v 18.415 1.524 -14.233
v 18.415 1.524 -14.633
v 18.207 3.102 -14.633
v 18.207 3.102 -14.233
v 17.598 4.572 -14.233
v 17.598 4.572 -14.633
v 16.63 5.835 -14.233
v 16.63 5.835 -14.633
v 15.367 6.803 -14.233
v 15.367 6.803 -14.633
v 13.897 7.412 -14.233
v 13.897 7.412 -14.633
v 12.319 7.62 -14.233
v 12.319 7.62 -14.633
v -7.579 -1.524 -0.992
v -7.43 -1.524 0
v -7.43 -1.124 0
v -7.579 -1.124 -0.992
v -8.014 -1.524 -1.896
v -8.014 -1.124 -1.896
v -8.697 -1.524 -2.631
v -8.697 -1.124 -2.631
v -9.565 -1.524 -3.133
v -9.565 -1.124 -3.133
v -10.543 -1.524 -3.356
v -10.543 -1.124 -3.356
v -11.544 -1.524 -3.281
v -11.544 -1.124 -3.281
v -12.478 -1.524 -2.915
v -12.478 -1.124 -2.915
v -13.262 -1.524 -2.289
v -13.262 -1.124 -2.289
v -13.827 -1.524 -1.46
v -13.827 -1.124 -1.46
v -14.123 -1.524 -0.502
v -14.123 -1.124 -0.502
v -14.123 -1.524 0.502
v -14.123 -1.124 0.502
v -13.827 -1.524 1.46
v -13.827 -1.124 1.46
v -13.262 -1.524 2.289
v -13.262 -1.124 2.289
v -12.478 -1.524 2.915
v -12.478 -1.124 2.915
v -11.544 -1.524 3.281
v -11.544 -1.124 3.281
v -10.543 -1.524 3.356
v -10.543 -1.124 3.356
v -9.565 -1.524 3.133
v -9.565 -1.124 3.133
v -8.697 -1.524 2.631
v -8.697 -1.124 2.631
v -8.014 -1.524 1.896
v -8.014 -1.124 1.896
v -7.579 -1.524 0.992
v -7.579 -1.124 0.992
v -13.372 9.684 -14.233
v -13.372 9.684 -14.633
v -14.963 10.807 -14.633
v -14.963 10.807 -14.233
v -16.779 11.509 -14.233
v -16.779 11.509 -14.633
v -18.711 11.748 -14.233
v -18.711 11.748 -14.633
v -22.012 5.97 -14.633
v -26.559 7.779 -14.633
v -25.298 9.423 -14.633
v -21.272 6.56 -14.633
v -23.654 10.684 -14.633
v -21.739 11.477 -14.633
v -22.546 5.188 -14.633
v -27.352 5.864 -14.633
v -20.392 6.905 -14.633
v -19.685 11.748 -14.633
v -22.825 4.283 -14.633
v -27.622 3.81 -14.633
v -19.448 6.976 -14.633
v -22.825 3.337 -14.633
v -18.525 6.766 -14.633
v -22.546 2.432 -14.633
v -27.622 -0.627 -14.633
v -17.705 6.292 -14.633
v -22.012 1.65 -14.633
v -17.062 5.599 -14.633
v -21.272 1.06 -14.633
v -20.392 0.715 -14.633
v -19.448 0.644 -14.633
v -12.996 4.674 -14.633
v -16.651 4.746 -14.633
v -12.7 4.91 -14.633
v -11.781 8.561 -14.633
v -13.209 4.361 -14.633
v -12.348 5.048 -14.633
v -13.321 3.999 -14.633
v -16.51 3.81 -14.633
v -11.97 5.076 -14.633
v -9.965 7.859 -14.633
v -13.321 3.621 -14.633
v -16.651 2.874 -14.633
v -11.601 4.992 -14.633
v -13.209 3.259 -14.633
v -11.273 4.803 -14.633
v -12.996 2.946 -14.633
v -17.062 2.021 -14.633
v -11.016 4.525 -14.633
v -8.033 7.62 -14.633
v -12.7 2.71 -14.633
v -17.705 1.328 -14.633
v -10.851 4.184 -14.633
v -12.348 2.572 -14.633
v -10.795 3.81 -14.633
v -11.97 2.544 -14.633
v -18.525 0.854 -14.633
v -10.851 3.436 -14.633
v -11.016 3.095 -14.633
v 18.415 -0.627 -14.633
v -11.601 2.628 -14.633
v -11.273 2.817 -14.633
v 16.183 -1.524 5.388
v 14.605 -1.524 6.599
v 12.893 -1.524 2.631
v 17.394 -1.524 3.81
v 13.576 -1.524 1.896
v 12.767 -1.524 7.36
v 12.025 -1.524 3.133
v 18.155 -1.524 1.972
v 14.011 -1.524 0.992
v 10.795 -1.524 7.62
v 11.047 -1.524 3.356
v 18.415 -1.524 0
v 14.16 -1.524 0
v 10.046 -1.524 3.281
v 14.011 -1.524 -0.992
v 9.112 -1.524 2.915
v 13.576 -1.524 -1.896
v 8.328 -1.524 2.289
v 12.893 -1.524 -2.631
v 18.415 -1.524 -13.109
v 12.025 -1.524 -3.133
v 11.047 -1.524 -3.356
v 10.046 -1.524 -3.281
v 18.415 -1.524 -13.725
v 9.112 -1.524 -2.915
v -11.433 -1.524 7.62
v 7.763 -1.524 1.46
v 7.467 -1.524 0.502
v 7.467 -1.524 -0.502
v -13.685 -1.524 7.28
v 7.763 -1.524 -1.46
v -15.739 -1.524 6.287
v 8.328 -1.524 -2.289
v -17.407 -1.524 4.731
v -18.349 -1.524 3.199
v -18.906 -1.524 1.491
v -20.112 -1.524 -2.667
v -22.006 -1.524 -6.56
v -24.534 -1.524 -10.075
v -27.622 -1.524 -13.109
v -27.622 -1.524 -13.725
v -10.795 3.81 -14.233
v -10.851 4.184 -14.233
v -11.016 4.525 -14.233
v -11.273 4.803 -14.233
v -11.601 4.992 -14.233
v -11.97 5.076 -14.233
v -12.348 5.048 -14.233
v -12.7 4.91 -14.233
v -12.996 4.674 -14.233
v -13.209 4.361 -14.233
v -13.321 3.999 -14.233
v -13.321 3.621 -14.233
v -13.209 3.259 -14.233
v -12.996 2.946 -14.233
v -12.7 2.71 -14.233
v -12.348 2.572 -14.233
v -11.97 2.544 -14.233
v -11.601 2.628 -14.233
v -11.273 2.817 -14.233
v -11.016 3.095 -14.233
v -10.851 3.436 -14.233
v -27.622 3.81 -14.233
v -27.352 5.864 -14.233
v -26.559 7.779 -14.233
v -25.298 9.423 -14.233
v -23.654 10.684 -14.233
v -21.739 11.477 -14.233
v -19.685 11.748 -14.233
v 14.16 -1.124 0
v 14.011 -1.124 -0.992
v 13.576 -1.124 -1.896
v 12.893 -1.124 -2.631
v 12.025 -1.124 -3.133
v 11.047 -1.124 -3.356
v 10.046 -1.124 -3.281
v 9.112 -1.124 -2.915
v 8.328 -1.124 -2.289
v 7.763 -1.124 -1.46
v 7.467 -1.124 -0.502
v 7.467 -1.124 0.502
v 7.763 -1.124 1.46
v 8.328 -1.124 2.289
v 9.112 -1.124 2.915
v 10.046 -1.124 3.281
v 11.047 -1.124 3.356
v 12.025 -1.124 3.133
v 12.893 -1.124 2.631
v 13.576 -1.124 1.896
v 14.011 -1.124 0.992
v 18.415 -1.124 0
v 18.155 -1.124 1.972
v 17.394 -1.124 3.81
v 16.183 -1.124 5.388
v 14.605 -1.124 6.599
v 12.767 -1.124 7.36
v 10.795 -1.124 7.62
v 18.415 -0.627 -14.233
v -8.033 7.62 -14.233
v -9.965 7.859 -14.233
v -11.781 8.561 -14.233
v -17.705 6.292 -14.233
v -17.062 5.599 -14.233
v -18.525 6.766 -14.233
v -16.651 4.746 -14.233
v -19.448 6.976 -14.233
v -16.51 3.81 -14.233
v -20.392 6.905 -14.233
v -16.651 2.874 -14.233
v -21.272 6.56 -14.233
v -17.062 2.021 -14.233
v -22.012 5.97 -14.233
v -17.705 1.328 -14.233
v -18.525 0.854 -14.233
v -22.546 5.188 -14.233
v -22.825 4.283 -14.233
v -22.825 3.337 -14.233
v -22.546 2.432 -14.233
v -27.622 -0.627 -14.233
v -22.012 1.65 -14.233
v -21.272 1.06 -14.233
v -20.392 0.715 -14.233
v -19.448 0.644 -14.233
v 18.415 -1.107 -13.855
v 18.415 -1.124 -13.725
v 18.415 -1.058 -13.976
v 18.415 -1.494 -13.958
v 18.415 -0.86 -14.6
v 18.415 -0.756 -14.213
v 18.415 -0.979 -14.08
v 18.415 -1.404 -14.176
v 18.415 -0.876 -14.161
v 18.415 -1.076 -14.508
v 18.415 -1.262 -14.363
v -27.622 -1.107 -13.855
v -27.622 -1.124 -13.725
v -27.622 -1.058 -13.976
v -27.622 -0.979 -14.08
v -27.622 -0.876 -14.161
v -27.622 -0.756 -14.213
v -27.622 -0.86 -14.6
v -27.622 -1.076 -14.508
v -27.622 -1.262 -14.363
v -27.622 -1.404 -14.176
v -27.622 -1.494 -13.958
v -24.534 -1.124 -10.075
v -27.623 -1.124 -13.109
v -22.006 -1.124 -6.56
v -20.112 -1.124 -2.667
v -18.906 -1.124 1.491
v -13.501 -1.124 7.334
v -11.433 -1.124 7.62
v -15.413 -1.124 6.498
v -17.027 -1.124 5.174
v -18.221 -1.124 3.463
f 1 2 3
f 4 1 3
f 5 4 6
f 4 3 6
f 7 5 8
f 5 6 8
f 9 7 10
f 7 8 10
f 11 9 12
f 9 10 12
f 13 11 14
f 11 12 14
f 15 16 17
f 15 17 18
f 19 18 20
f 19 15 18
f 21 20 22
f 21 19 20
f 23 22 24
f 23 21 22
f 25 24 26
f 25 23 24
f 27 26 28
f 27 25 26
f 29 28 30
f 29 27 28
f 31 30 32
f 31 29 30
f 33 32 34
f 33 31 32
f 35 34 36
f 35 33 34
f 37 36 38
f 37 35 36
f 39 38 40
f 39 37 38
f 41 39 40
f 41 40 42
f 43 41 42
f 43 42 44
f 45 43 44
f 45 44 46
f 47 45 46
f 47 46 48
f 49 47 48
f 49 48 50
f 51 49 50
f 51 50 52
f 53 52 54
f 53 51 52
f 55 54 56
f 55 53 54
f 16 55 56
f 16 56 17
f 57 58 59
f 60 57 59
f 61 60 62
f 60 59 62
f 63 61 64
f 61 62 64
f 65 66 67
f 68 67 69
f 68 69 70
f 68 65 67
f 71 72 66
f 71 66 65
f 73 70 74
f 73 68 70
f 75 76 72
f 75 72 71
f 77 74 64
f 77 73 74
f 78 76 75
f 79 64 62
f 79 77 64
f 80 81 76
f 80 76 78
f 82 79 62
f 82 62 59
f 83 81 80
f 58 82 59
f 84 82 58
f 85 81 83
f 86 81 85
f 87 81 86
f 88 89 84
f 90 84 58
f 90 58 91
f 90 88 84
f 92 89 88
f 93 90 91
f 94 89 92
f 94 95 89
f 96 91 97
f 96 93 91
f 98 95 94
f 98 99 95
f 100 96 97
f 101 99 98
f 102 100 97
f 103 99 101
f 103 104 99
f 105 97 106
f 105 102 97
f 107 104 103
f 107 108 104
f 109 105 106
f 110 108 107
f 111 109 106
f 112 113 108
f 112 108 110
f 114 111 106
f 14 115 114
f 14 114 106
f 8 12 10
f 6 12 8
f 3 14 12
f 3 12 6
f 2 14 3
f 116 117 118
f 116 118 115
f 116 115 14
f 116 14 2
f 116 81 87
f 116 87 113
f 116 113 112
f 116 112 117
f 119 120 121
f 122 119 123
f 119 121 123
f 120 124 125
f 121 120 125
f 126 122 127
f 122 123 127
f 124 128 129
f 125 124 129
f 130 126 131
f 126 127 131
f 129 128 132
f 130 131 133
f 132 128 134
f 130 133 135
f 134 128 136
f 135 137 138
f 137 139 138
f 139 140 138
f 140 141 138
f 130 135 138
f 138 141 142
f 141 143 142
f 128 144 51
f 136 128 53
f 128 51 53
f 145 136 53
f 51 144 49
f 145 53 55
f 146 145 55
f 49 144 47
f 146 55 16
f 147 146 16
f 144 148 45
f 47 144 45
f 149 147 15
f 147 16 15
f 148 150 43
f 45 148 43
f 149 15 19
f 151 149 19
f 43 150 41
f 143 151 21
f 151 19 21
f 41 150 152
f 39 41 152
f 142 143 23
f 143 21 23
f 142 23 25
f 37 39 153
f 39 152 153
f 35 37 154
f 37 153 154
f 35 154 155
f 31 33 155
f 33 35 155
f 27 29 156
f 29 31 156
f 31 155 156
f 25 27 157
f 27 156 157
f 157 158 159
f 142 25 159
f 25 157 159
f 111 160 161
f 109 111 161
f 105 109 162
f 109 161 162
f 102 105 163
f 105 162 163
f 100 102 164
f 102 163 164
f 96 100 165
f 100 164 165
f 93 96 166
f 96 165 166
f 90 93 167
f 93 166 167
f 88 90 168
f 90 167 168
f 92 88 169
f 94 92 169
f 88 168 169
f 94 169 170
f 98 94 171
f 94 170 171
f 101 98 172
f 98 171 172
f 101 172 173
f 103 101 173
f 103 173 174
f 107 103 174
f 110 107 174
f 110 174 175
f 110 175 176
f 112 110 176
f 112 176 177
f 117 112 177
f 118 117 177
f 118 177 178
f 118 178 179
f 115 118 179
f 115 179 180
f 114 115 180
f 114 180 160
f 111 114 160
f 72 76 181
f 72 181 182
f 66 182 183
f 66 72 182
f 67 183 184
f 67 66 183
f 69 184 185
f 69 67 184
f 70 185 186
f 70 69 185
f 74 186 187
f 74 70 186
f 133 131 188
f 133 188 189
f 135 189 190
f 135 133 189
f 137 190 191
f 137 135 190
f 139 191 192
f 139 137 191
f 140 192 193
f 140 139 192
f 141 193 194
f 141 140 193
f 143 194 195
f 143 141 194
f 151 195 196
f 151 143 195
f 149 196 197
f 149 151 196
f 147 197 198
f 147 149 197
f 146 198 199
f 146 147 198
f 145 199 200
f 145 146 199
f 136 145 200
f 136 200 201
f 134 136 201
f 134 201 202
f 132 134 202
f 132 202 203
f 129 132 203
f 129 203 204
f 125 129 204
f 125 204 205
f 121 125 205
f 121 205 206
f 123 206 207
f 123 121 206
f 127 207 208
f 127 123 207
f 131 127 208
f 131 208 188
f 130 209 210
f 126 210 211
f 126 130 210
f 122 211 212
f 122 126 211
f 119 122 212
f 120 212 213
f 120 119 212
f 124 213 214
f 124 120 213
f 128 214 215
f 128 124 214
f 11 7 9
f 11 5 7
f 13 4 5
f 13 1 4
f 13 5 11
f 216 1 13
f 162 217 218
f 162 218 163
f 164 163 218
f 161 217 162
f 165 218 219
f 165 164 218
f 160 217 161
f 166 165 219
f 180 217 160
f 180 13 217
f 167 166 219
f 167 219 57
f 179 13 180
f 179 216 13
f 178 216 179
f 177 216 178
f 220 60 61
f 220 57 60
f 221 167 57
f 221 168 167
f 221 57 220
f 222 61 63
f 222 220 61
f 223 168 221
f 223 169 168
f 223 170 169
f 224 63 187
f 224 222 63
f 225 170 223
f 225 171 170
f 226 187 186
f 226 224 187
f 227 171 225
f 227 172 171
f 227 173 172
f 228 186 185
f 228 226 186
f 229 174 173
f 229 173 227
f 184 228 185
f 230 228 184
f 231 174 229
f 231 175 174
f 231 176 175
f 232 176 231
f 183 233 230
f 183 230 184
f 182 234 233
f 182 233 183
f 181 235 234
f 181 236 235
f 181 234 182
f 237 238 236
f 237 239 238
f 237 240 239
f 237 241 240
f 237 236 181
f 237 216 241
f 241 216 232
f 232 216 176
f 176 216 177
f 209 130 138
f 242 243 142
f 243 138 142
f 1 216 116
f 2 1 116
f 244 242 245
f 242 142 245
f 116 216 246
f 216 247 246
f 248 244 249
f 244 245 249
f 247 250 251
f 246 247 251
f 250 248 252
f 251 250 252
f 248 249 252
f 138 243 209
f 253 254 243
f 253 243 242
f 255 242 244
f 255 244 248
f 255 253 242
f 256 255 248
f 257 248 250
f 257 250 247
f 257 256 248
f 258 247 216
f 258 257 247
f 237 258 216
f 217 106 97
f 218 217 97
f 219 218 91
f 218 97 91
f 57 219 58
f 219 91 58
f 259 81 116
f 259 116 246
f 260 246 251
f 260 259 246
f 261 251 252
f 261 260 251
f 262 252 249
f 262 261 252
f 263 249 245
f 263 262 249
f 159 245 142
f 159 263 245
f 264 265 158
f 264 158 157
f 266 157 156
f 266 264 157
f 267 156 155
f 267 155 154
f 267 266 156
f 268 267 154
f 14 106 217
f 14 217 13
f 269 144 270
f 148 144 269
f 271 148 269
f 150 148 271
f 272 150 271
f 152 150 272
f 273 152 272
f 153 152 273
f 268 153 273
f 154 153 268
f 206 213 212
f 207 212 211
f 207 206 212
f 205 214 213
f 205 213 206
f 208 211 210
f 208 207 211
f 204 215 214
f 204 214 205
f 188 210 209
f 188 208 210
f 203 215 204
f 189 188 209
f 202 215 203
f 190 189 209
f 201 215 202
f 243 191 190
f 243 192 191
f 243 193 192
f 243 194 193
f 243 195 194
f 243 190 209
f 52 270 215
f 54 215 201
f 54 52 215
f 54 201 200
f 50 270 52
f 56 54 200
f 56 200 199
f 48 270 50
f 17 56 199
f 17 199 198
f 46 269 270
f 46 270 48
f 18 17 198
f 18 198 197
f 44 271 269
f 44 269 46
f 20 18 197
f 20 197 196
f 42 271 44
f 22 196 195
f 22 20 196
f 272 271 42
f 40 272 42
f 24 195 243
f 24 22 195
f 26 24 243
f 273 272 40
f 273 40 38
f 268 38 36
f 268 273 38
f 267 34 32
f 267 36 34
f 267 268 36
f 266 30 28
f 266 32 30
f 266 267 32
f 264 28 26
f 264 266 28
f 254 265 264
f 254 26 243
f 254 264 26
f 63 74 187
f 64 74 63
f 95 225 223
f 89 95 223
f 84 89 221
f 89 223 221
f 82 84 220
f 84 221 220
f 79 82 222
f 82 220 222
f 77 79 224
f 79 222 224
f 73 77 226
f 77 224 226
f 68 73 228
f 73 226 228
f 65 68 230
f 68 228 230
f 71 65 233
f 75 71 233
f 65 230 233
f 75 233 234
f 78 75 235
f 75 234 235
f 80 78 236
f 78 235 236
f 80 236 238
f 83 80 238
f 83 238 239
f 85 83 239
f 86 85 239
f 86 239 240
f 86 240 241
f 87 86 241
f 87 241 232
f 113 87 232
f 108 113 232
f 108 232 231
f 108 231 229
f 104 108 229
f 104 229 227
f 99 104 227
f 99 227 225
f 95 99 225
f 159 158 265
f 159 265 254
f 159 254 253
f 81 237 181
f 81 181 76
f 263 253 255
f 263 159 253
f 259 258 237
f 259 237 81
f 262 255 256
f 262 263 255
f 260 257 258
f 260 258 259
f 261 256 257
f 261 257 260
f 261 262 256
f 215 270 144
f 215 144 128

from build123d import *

# Parameters (mm, degrees)
SKETCH1_R                    = 3.3655
BOSS_EXTRUDE1_DEPTH          = 1.524
SKETCH2_R                    = 3.3655
CUT_EXTRUDE1_DEPTH           = 1.524
CUT_EXTRUDE1_DRAFT           = 46
CUT_EXTRUDE1_PROFILE_2_DEPTH = 1.524
CUT_EXTRUDE1_PROFILE_2_DRAFT = 46
FILLET1_R                    = 25.4
SKETCH3_W                    = 15.875
SKETCH3_H                    = 1.524
BOSS_EXTRUDE2_DEPTH          = 11.7475
FILLET3_R                    = 7.9375
SKETCH5_W                    = 30.1625
SKETCH5_H                    = 1.524
BOSS_EXTRUDE3_DEPTH          = 7.62
SKETCH4_R                    = 3.175
SKETCH4_R_2                  = 1.27
CUT_EXTRUDE2_DEPTH           = 19.05
FILLET7_R                    = 7.62
FILLET10_R                   = 6.096
FILLET13_R                   = 7.9375
FILLET14_R                   = 7.9375
CONVERT_SOLID1_START         = -0.62672976
CONVERT_SOLID1_OUTLINE_R     = 3.3655
CONVERT_SOLID1_DEPTH         = 12.37422976
CONVERT_SOLID1_START_2       = -1.124
CONVERT_SOLID1_2_OUTLINE_R   = 3.3655
CONVERT_SOLID1_2_DEPTH       = 0.508
CONVERT_SOLID1_START_3       = -1.524
CONVERT_SOLID1_3_OUTLINE_R   = 3.3655
CONVERT_SOLID1_3_DEPTH       = 0.4
CONVERT_SOLID1_START_4       = -27.6225
CONVERT_SOLID1_4_DEPTH       = 46.0375


with BuildPart() as part:
    # Sketch1 → Boss-Extrude1 (new body)
    with BuildSketch(Plane(origin=(0, 0, 0), x_dir=(1, 0, 0), z_dir=(0, 1, 0))):
        Polygon((-27.6225, 14.6328892), (-27.6225, 13.1088892), (-18.415, 6.7588892), (-18.415, -7.62), (18.415, -7.62), (18.415, 14.6328892), align=None)
        with Locations(Location((-10.795, 0, 0), (0, 0, 270))):
            Circle(SKETCH1_R, mode=Mode.SUBTRACT)
        with Locations(Location((10.795, 0, 0), (0, 0, 270))):
            Circle(SKETCH1_R, mode=Mode.SUBTRACT)
    extrude(amount=-BOSS_EXTRUDE1_DEPTH)


with BuildPart() as cut_extrude1_tool:
    # Sketch2 → Cut-Extrude1 (with draft: the straight prism first)
    with BuildSketch(Plane.XZ.offset(1.524)):
        with Locations((-10.795, 0)):
            Circle(SKETCH2_R)
    extrude(amount=-CUT_EXTRUDE1_DEPTH)
    # Cut-Extrude1: the draft: its side faces are tilted about the plane it starts from
    cut_extrude1_sides = [cut_extrude1_tool.faces().sort_by_distance(p)[0] for p in [
        (-14.1605, -0.762, 0),
    ]]
    draft(cut_extrude1_sides, Plane.XZ.offset(1.524), CUT_EXTRUDE1_DRAFT)


with BuildPart() as part_1:
    add(part.part)

    # Cut-Extrude1: cut by cut_extrude1_tool
    add(cut_extrude1_tool.part, mode=Mode.SUBTRACT)


with BuildPart() as cut_extrude1_profile_2_tool:
    # Sketch2 → Cut-Extrude1 profile 2 (with draft: the straight prism first)
    with BuildSketch(Plane.XZ.offset(1.524)):
        with Locations((10.795, 0)):
            Circle(SKETCH2_R)
    extrude(amount=-CUT_EXTRUDE1_PROFILE_2_DEPTH)
    # Cut-Extrude1 profile 2: the draft: its side faces are tilted about the plane it starts from
    cut_extrude1_profile_2_sides = [cut_extrude1_profile_2_tool.faces().sort_by_distance(p)[0] for p in [
        (7.4295, -0.762, 0),
    ]]
    draft(cut_extrude1_profile_2_sides, Plane.XZ.offset(1.524), CUT_EXTRUDE1_PROFILE_2_DRAFT)


with BuildPart() as part_2:
    add(part_1.part)

    # Cut-Extrude1 profile 2: cut by cut_extrude1_profile_2_tool
    add(cut_extrude1_profile_2_tool.part, mode=Mode.SUBTRACT)

    # Fillet1
    # the kernel refuses this fillet: 25.4 mm, written as the material it adds along each edge
    with BuildSketch(Plane(origin=(-18.415, 0, -6.7588892), x_dir=(0, 0, 1), z_dir=(0, -1, 0))) as fillet1_piece_1:
        with BuildLine():
            CenterArc((13.219439025, 25.4), FILLET1_R, 219.605652394, 50.394347606)
            Line((-6.35, 9.2075), (-6.74138878, 8.88365))
            ThreePointArc((-6.74138878, 8.88365), (-3.593192095, 4.315341658), (-0.418192095, -0.288408342))
            Line((-0.418192095, -0.288408342), (0, -0.508))
            Line((0, -0.508), (13.219439025, -0.508))
            Line((13.219439025, -0.508), (13.219439025, 0))
        make_face()
    extrude(amount=1.524)

    # Sketch3 → Boss-Extrude2 (add)
    with BuildSketch(Plane(origin=(0, 0, 0), x_dir=(1, 0, 0), z_dir=(0, 1, 0))):
        with Locations((-19.685, 13.8708892)):
            Rectangle(SKETCH3_W, SKETCH3_H)
    extrude(amount=BOSS_EXTRUDE2_DEPTH)

    # Fillet3
    fillet3_edges = [part_2.edges().sort_by_distance(p)[0] for p in [
        (-27.6225, 11.7475, -13.8708892),
    ]]
    fillet(fillet3_edges, radius=FILLET3_R)

    # Sketch5 → Boss-Extrude3 (add)
    with BuildSketch(Plane(origin=(0, 0, 0), x_dir=(1, 0, 0), z_dir=(0, 1, 0))):
        with Locations((3.33375, 13.8708892)):
            Rectangle(SKETCH5_W, SKETCH5_H)
    extrude(amount=BOSS_EXTRUDE3_DEPTH)

    # Sketch4 → Cut-Extrude2 (cut)
    with BuildSketch(Plane.XY.offset(-13.1088892)):
        with Locations((-19.685, 3.81)):
            Circle(SKETCH4_R)
        with Locations((-12.065, 3.81)):
            Circle(SKETCH4_R_2)
    extrude(amount=-CUT_EXTRUDE2_DEPTH, mode=Mode.SUBTRACT)

    # Fillet7
    fillet7_edges = [part_2.edges().sort_by_distance(p)[0] for p in [
        (18.415, -0.762, 7.62),
        (-18.415, -0.762, 7.62),
    ]]
    fillet(fillet7_edges, radius=FILLET7_R)

    # Fillet10
    fillet10_edges = [part_2.edges().sort_by_distance(p)[0] for p in [
        (18.415, 7.62, -13.8708892),
    ]]
    fillet(fillet10_edges, radius=FILLET10_R)

    # Fillet13
    # the kernel refuses this fillet: 7.9375 mm, written as the material it takes off along each edge
    with BuildSketch(Plane(origin=(-11.7475, 11.7475, -32.041185758), x_dir=(0, -1, 0), z_dir=(0, 0, 1))) as fillet13_piece_1:
        with BuildLine():
            CenterArc((7.9375, -6.963318623), FILLET13_R, 118.685402014, 61.314597986)
            Line((0, -6.963318623), (-0.15875, -6.963318623))
            Line((-0.15875, -6.963318623), (-0.15875, 0))
            Line((-0.15875, 0), (0, 0.15875))
            ThreePointArc((0, 0.15875), (2.06375, 0.15875), (4.0513, 0.139266372))
            Line((4.0513, 0.139266372), (4.1275, 0))
        make_face()
    extrude(amount=36.340593117, mode=Mode.SUBTRACT)

    # Fillet14
    fillet14_edges = [part_2.edges().sort_by_distance(p)[0] for p in [
        (-11.7475, 7.62, -13.8708892),
    ]]
    fillet(fillet14_edges, radius=FILLET14_R)

    # Convert-Solid1: read off the stored shape, not the designer's step
    # Convert-Solid1 outline → Convert-Solid1 (cut)
    with BuildSketch(Plane(origin=(0, 0, 0), x_dir=(1, 0, 0), z_dir=(0, 1, 0)).offset(CONVERT_SOLID1_START)):
        with BuildLine():
            Line((18.415, 14.2328892), (-27.6225, 14.2328892))
            Line((-27.6225, 14.2328892), (-27.6225, 13.1088892))
            ThreePointArc((-27.6225, 13.1088892), (-22.006205533, 6.560067822), (-18.905914469, -1.490896113))
            ThreePointArc((-18.905914469, -1.490896113), (-16.265567707, -5.891732699), (-11.43318881, -7.62))
            Line((-11.43318881, -7.62), (10.795, -7.62))
            ThreePointArc((10.795, -7.62), (16.183153673, -5.388153673), (18.415, 0))
            Line((18.415, 0), (18.415, 14.2328892))
        make_face()
        with Locations((10.795, 0)):
            Circle(CONVERT_SOLID1_OUTLINE_R, mode=Mode.SUBTRACT)
        with Locations((-10.795, 0)):
            Circle(CONVERT_SOLID1_OUTLINE_R, mode=Mode.SUBTRACT)
    extrude(amount=CONVERT_SOLID1_DEPTH, mode=Mode.SUBTRACT)

    # Convert-Solid1 2 outline → Convert-Solid1 2 (cut)
    with BuildSketch(Plane(origin=(0, 0, 0), x_dir=(1, 0, 0), z_dir=(0, 1, 0)).offset(CONVERT_SOLID1_START_2)):
        with BuildLine():
            Line((18.415, 0), (18.415, 13.1088892))
            Line((18.415, 13.1088892), (-27.6225, 13.1088892))
            ThreePointArc((-27.6225, 13.1088892), (-22.006205533, 6.560067822), (-18.905914469, -1.490896113))
            ThreePointArc((-18.905914469, -1.490896113), (-16.265567707, -5.891732699), (-11.43318881, -7.62))
            Line((-11.43318881, -7.62), (10.795, -7.62))
            ThreePointArc((10.795, -7.62), (16.183153673, -5.388153673), (18.415, 0))
        make_face()
        with Locations((-10.795, 0)):
            Circle(CONVERT_SOLID1_2_OUTLINE_R, mode=Mode.SUBTRACT)
        with Locations((10.795, 0)):
            Circle(CONVERT_SOLID1_2_OUTLINE_R, mode=Mode.SUBTRACT)
    extrude(amount=CONVERT_SOLID1_2_DEPTH, mode=Mode.SUBTRACT)

    # Convert-Solid1 3 outline → Convert-Solid1 3 (add)
    with BuildSketch(Plane(origin=(0, 0, 0), x_dir=(1, 0, 0), z_dir=(0, 1, 0)).offset(CONVERT_SOLID1_START_3)):
        with BuildLine():
            Line((18.415, 0), (18.415, 13.1088892))
            Line((18.415, 13.1088892), (-27.6225, 13.1088892))
            ThreePointArc((-27.6225, 13.1088892), (-22.006205533, 6.560067822), (-18.905914469, -1.490896113))
            ThreePointArc((-18.905914469, -1.490896113), (-16.265567707, -5.891732699), (-11.43318881, -7.62))
            Line((-11.43318881, -7.62), (10.795, -7.62))
            ThreePointArc((10.795, -7.62), (16.183153673, -5.388153673), (18.415, 0))
        make_face()
        with Locations((-10.795, 0)):
            Circle(CONVERT_SOLID1_3_OUTLINE_R, mode=Mode.SUBTRACT)
        with Locations((10.795, 0)):
            Circle(CONVERT_SOLID1_3_OUTLINE_R, mode=Mode.SUBTRACT)
    extrude(amount=CONVERT_SOLID1_3_DEPTH)

    # Convert-Solid1 4 outline → Convert-Solid1 4 (cut)
    with BuildSketch(Plane.YZ.offset(CONVERT_SOLID1_START_4)):
        with BuildLine():
            ThreePointArc((-0.62672976, -14.632825801), (-1.261835359, -14.36313734), (-1.524, -13.7248892))
            Line((-1.524, -13.7248892), (-1.524000001, -13.1088892))
            Line((-1.524000001, -13.1088892), (-3, -13.1088892))
            Line((-3, -13.1088892), (-3, -16))
            Line((-3, -16), (-0.62672976, -16))
            Line((-0.62672976, -16), (-0.62672976, -14.632825801))
        make_face()
        with BuildLine():
            Line((-0.62672976, -13.1088892), (-1.124, -13.1088892))
            Line((-1.124, -13.1088892), (-1.124, -13.7248892))
            ThreePointArc((-1.124, -13.7248892), (-0.978983965, -14.080285656), (-0.62672976, -14.232775873))
            Line((-0.62672976, -14.232775873), (-0.62672976, -13.1088892))
        make_face()
    extrude(amount=CONVERT_SOLID1_4_DEPTH, mode=Mode.SUBTRACT)


solid = part_2.part
